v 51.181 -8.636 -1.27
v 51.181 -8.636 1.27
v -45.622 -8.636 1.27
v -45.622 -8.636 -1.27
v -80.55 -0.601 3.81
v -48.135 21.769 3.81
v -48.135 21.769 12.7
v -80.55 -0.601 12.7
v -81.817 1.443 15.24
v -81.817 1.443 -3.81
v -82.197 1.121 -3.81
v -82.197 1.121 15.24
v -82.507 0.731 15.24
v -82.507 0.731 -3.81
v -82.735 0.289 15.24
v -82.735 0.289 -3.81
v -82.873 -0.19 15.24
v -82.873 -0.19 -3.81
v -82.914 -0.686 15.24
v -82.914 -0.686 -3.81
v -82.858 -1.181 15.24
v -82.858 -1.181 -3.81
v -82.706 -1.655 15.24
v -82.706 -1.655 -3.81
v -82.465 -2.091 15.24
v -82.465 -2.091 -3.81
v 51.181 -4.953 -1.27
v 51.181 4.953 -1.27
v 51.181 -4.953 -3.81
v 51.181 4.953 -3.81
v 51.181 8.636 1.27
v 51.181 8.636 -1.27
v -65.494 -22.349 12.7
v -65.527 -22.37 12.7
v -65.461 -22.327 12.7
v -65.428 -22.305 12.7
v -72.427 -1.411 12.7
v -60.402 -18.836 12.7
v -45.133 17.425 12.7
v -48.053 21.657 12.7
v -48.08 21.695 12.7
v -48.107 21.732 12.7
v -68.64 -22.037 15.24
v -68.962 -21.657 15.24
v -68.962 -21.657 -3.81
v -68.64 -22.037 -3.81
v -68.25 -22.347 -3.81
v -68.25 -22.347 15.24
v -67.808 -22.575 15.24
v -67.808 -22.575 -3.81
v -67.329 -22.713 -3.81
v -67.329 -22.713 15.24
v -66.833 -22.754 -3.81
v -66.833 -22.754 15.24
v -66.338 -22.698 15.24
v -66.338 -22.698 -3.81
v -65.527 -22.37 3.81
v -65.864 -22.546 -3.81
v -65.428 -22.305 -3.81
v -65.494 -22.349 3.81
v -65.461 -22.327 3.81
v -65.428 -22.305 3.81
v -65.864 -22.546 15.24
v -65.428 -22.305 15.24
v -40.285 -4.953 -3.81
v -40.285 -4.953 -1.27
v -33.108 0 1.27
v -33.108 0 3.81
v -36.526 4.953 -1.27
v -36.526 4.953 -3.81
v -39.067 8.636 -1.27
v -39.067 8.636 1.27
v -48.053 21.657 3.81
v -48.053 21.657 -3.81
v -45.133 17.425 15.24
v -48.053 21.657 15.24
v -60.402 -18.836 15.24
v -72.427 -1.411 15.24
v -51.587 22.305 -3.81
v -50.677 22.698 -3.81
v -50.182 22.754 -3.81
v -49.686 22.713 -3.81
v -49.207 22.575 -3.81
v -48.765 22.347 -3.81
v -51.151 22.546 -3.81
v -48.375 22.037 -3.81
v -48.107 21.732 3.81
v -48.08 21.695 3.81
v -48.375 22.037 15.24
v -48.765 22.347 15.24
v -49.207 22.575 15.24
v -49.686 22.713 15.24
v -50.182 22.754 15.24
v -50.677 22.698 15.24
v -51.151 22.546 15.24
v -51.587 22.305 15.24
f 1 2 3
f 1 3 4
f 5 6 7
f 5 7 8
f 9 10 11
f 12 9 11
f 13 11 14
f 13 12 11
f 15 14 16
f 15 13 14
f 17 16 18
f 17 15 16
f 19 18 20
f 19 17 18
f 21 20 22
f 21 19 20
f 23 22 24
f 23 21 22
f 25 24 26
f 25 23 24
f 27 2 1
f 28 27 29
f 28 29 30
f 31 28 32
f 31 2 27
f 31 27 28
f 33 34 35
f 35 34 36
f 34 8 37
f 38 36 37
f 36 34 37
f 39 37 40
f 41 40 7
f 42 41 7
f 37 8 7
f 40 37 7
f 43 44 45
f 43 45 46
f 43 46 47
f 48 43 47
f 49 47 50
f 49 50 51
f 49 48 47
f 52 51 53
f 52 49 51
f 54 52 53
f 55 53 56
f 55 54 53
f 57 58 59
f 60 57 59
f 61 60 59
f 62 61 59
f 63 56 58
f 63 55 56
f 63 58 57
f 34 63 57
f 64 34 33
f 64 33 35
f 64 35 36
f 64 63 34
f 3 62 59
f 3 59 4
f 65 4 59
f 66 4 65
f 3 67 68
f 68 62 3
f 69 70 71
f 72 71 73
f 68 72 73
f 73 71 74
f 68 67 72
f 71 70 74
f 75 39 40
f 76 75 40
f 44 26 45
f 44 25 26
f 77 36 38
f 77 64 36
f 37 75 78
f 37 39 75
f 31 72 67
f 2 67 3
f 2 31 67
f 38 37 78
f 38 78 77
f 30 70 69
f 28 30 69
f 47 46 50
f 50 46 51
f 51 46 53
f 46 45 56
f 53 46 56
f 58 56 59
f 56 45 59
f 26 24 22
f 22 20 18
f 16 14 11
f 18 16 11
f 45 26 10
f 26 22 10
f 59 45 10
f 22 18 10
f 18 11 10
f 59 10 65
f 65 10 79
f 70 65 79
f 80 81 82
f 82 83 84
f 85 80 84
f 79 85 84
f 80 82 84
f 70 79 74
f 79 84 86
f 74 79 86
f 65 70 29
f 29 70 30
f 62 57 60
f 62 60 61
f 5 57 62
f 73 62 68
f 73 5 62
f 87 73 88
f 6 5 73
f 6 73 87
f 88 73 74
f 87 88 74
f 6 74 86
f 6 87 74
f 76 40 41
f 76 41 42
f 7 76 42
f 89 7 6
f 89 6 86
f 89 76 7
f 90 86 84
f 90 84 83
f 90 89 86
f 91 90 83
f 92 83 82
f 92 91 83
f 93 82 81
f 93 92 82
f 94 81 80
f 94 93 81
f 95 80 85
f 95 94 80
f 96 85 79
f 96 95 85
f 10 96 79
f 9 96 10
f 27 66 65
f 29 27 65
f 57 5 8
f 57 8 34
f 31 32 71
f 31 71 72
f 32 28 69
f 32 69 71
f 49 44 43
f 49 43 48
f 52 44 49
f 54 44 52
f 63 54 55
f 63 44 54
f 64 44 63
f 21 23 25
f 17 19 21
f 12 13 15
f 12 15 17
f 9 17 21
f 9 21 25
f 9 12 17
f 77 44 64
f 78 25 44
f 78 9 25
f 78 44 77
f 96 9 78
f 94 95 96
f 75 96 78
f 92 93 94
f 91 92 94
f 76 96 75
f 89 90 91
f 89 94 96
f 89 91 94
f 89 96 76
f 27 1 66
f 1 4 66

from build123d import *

# Parameters (mm, degrees)
F1_DEPTH = 51.181
F3_DEPTH = 15.24
F4_DEPTH = 3.81
F6_START = 2.54
F6_DEPTH = 8.89
F8_START = 2.54
F8_DEPTH = 20.574


with BuildPart() as f1:
    # F0 (on Right) → F1 (new body, symmetric)
    with BuildSketch(Plane.YZ):
        Polygon((8.636, 1.27), (-8.636, 1.27), (-8.636, -1.27), (-4.953, -1.27), (-4.953, -3.81), (4.953, -3.81), (4.953, -1.27), (8.636, -1.27), align=None)
    extrude(amount=F1_DEPTH, both=True)

    # F2 (on Top) → F3 (join)
    with BuildSketch(Plane.XY):
        with BuildLine():
            Line((-65.4284994702, -22.3050312109), (-33.107586205, 0))
            Line((-33.107586205, 0), (-48.0534703304, 21.6572045976))
            ThreePointArc((-48.0534703304, 21.6572045976), (-49.6859023505, 22.7128681239), (-51.5866729398, 22.3050312109))
            Line((-51.5866729398, 22.3050312109), (-81.8170715936, 1.442687998))
            ThreePointArc((-81.8170715936, 1.442687998), (-82.87273512, -0.189744022), (-82.464898207, -2.0905146114))
            Line((-82.464898207, -2.0905146114), (-68.9617020796, -21.6572045976))
            ThreePointArc((-68.9617020796, -21.6572045976), (-67.3292700595, -22.7128681239), (-65.4284994702, -22.3050312109))
        make_face()
    extrude(amount=F3_DEPTH)

    # F2 (on Top) → F4 (join)
    with BuildSketch(Plane.XY):
        with BuildLine():
            Line((-65.4284994702, -22.3050312109), (-33.107586205, 0))
            Line((-33.107586205, 0), (-48.0534703304, 21.6572045976))
            ThreePointArc((-48.0534703304, 21.6572045976), (-49.6859023505, 22.7128681239), (-51.5866729398, 22.3050312109))
            Line((-51.5866729398, 22.3050312109), (-81.8170715936, 1.442687998))
            ThreePointArc((-81.8170715936, 1.442687998), (-82.87273512, -0.189744022), (-82.464898207, -2.0905146114))
            Line((-82.464898207, -2.0905146114), (-68.9617020796, -21.6572045976))
            ThreePointArc((-68.9617020796, -21.6572045976), (-67.3292700595, -22.7128681239), (-65.4284994702, -22.3050312109))
        make_face()
    extrude(amount=-F4_DEPTH)

    # F5 (on face) → F6 (cut)
    with BuildSketch(Plane.XY.offset(1.27).offset(F6_START)):
        Polygon((-40.4348767453, 27.082724402), (-80.5502137997, -0.6013276448), (-61.860116521, -27.6840520468), (-21.7447794666, 0), align=None)
    extrude(amount=F6_DEPTH, mode=Mode.SUBTRACT)

    # F7 (on face) → F8 (cut)
    with BuildSketch(Plane.XY.offset(1.27).offset(F8_START)):
        Polygon((-40.4291285362, 20.671173085), (-72.4270038917, -1.4109259767), (-57.7466082971, -22.6834267065), (-25.7487329416, -0.6013276448), align=None)
    extrude(amount=F8_DEPTH, mode=Mode.SUBTRACT)


solid = f1.part
